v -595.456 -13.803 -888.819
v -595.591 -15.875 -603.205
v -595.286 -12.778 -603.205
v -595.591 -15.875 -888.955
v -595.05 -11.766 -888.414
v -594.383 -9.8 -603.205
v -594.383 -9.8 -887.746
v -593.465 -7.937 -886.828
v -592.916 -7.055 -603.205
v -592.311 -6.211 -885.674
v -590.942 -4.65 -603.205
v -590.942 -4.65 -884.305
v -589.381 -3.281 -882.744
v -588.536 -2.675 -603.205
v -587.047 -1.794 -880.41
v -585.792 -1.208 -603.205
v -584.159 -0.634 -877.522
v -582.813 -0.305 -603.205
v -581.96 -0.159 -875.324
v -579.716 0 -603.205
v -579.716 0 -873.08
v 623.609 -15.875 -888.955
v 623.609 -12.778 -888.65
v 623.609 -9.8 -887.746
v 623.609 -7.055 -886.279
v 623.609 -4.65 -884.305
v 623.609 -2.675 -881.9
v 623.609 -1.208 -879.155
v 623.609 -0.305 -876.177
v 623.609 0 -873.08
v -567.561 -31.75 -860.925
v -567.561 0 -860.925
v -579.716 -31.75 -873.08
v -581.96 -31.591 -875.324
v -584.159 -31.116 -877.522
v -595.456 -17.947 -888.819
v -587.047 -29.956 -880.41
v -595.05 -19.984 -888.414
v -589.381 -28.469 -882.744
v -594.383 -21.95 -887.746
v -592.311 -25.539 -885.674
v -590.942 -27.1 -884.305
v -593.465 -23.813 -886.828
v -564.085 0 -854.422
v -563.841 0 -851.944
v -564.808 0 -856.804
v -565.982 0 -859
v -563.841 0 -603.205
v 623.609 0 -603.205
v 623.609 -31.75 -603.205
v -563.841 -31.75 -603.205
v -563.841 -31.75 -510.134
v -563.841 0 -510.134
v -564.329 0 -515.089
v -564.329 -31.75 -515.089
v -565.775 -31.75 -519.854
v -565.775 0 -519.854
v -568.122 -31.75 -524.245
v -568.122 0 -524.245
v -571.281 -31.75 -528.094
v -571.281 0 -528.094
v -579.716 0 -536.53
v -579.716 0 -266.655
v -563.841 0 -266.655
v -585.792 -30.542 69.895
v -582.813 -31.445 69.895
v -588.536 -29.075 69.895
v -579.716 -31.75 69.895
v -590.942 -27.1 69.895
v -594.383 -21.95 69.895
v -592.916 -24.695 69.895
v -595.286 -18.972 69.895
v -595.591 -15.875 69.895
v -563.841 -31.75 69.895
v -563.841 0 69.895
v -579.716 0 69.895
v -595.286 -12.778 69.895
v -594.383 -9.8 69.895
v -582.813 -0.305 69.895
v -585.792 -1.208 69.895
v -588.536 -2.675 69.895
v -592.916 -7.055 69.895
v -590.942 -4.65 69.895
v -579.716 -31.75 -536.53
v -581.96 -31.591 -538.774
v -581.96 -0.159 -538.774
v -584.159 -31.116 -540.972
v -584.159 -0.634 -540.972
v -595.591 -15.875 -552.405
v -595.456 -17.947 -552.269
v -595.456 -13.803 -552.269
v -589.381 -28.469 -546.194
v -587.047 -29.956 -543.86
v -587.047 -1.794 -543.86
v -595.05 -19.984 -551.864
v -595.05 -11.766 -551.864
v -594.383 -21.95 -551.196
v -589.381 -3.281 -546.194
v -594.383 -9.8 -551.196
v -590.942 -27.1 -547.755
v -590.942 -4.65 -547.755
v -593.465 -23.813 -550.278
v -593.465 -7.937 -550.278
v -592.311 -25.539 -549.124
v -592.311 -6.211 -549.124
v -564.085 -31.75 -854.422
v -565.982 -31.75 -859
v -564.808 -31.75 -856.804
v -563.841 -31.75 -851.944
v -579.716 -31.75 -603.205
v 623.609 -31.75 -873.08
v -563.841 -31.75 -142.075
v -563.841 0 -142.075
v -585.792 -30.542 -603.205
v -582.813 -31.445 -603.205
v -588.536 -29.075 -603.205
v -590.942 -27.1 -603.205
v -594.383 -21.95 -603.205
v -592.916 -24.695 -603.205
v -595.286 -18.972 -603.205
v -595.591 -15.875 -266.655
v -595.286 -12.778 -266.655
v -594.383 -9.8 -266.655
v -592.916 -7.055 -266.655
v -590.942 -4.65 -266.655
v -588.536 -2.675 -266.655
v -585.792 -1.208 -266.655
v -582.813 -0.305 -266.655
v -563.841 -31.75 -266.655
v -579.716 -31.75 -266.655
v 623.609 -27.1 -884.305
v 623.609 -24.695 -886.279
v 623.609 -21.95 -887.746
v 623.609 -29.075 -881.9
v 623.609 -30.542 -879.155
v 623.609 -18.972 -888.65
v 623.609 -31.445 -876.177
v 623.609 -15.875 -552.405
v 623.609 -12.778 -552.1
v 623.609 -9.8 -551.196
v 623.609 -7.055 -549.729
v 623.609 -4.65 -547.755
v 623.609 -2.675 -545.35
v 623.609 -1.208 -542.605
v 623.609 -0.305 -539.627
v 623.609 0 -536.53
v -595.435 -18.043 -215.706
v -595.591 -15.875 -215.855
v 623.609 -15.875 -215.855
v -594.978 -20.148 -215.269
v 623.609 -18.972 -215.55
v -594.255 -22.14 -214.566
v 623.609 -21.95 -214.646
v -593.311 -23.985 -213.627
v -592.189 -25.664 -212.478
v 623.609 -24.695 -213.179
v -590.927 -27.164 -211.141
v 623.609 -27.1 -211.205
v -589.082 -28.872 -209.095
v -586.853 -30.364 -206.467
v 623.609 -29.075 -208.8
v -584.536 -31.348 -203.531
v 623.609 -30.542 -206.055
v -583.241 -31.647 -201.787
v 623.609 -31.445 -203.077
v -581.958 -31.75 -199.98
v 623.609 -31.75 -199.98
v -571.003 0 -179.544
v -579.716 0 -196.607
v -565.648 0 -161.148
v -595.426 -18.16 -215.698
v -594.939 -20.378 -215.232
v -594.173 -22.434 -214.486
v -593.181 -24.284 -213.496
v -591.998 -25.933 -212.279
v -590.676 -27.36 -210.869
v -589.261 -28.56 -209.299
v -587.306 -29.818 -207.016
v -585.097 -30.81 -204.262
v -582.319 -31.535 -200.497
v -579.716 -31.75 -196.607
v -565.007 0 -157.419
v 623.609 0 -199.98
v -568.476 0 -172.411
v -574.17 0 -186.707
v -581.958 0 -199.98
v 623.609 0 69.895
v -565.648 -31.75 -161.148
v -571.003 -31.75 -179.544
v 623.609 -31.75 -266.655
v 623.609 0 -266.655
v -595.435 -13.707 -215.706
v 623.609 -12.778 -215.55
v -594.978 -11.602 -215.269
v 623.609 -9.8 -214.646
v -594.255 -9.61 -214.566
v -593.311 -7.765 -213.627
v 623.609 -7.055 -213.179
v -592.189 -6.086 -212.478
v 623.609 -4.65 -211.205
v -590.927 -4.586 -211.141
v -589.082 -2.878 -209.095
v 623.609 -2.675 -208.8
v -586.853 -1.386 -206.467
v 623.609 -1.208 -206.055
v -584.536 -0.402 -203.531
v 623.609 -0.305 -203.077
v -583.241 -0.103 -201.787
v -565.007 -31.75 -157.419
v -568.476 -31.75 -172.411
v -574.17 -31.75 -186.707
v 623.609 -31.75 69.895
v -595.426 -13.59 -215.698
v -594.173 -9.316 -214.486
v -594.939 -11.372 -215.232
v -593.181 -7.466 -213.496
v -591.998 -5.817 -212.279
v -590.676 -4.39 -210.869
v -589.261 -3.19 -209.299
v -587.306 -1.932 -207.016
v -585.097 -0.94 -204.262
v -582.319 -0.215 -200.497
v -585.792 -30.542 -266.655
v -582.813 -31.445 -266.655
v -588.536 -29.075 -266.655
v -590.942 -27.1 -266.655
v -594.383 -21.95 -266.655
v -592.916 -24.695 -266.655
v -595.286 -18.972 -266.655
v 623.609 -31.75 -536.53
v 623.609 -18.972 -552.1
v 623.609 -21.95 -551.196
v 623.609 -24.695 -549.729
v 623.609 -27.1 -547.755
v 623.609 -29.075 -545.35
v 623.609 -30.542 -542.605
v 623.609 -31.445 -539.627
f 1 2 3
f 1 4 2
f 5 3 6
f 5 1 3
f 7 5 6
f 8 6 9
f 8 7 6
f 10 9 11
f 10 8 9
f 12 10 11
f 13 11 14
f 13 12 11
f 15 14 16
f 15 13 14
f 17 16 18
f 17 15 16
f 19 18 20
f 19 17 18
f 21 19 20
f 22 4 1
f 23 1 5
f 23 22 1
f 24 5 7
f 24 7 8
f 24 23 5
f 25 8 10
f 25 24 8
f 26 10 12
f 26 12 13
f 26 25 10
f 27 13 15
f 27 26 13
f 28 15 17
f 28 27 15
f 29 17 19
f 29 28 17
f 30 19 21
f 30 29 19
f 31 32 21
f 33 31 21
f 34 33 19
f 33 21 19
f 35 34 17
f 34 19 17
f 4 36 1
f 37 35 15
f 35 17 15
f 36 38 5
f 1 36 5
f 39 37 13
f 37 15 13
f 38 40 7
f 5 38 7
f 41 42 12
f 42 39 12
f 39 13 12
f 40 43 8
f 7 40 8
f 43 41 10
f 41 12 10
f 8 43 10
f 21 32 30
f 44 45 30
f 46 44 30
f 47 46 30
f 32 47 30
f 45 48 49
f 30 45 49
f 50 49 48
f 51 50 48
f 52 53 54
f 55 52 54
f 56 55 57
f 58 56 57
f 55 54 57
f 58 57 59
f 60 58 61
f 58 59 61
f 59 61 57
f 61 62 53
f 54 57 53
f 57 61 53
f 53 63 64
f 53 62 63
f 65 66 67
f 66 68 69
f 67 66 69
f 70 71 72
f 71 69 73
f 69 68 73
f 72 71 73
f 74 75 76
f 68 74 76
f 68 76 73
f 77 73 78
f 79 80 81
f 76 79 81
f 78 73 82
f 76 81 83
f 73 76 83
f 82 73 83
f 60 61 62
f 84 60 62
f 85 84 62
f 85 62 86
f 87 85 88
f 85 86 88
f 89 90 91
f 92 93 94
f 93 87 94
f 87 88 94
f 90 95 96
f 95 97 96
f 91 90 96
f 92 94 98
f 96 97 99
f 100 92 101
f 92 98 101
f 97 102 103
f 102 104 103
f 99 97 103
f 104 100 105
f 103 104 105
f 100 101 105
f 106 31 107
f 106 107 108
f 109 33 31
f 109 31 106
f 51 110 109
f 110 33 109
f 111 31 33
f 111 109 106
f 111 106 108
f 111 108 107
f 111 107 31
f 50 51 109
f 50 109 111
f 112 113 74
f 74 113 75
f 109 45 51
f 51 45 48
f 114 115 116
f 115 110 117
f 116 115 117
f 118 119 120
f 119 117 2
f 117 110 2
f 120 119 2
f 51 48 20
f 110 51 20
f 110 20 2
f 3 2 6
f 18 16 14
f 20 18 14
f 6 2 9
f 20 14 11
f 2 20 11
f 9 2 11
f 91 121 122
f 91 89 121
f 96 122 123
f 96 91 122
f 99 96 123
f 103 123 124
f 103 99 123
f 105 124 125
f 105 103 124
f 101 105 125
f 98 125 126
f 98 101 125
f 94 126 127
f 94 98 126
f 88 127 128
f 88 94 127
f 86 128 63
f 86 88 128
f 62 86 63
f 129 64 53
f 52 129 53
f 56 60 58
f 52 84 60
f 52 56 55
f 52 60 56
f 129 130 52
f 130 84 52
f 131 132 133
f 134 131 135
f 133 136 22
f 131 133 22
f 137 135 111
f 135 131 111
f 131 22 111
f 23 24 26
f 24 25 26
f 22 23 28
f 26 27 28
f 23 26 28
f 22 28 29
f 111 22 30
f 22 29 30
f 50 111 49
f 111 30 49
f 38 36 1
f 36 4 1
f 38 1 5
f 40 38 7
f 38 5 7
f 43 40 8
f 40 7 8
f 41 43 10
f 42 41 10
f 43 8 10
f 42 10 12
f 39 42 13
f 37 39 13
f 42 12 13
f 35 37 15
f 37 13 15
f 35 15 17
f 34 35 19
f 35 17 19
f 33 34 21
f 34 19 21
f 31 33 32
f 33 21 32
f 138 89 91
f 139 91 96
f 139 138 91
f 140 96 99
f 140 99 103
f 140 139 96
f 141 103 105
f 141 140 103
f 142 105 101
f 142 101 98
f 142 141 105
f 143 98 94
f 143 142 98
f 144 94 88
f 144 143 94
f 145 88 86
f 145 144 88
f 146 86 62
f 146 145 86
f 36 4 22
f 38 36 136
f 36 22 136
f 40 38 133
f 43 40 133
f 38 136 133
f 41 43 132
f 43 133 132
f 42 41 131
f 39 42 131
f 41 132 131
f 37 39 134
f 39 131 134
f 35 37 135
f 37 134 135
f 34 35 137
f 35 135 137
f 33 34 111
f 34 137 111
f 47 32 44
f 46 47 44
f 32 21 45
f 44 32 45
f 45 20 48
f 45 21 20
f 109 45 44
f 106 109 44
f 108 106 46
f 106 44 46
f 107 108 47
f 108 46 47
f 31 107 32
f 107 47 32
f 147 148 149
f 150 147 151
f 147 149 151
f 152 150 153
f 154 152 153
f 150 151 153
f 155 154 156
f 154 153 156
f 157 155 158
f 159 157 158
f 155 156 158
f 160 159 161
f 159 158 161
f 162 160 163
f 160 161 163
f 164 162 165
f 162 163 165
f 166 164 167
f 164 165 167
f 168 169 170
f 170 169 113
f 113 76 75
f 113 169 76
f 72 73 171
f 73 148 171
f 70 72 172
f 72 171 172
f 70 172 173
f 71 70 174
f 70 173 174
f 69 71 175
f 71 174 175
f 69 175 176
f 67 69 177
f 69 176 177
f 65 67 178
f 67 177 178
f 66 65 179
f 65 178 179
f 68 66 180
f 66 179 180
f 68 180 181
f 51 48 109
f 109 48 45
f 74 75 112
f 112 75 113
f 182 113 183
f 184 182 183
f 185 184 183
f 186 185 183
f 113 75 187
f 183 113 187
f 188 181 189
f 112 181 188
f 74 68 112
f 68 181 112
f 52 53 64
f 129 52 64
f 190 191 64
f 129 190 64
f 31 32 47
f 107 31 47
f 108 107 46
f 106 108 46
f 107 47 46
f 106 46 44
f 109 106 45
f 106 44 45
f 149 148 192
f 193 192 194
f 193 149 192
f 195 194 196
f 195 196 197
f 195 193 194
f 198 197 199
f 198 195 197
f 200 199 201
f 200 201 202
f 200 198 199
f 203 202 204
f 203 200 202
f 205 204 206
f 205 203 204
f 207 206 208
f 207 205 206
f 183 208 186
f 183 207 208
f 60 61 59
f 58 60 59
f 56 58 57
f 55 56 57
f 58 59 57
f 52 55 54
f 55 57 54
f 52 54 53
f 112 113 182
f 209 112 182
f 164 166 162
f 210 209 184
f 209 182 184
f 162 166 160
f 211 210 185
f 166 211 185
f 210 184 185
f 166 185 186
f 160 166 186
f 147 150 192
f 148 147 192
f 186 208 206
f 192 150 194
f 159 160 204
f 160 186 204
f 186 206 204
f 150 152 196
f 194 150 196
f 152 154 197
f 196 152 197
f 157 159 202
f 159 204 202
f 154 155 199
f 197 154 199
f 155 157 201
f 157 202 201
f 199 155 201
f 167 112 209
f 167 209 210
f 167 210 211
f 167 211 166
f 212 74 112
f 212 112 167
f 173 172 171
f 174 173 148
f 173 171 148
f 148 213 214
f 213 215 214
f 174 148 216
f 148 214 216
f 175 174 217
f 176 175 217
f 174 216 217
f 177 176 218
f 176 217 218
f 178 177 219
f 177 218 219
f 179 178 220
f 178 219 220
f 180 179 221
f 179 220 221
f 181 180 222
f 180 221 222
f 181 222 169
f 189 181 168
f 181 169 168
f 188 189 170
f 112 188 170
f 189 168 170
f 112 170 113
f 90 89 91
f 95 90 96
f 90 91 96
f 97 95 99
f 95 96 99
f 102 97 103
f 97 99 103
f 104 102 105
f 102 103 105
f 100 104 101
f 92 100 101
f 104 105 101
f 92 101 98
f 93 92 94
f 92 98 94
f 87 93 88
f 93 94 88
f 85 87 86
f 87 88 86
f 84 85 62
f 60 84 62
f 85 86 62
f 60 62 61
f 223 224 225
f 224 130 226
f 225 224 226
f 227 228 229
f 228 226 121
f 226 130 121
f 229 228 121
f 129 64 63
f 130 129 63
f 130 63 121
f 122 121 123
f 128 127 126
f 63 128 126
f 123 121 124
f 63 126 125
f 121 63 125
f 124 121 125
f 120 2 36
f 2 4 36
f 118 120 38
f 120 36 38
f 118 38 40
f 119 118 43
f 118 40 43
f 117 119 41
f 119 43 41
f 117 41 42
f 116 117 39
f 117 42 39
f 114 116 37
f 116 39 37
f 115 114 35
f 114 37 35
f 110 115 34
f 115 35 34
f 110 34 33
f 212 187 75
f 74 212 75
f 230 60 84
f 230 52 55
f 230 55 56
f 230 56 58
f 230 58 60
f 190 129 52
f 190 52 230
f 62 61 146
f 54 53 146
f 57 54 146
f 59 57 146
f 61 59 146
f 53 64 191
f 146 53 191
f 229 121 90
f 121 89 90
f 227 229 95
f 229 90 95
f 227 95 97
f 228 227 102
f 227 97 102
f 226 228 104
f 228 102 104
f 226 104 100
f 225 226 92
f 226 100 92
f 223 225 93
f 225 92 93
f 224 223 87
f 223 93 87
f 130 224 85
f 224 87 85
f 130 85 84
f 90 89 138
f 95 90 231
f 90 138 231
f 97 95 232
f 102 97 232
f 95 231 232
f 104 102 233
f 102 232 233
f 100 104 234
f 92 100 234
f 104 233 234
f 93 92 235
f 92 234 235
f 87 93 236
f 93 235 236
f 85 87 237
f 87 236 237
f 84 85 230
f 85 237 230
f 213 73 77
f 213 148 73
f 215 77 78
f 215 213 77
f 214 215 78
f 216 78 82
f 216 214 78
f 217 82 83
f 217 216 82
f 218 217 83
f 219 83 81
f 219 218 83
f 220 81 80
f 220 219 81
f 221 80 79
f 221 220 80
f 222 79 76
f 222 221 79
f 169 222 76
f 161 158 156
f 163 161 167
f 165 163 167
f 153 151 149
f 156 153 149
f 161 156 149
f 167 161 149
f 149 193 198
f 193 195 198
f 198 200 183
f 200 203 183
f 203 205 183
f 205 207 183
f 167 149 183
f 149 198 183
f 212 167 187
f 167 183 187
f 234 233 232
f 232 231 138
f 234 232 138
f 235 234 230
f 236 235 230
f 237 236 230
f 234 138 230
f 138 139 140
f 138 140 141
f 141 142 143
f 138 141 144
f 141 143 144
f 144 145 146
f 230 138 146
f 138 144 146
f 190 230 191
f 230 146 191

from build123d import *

# Parameters (mm, degrees)
F1_DEPTH = 31.75
F2_DEPTH = 31.75
F3_R     = 15.87499
F3_2_R   = 15.87499
F3_3_R   = 15.87499
F3_4_R   = 15.87499
F3_5_R   = 15.87499
F3_6_R   = 15.87499


# Not quite as in the source:
# - a fillet or chamfer is up to 0.001 mm smaller than in the source, because OpenCascade refuses the exact size


with BuildPart() as f1:
    # F0 (on Front) → F1 (new body)
    with BuildSketch(Plane.XZ):
        with BuildLine():
            Line((623.6085797757, 69.8951120117), (-563.8414202243, 69.8951120117))
            Line((-563.8414202243, 69.8951120117), (-563.8414202243, -142.074555243))
            ThreePointArc((-563.8414202243, -142.074555243), (-572.1158610243, -182.2354815272), (-595.5914202243, -215.8548879883))
            Line((-595.5914202243, -215.8548879883), (623.6085797757, -215.8548879883))
            Line((623.6085797757, -215.8548879883), (623.6085797757, 69.8951120117))
        make_face()
    extrude(amount=F1_DEPTH)

    # F3#6 (radius 15.875 in the source; OpenCascade refuses exactly that, so slightly less here)
    f3_6_edges = [f1.edges().sort_by_distance(p)[0] for p in [
        (14.00858, -31.75, -215.854888),
        (14.00858, 0, -215.854888),
    ]]
    fillet(f3_6_edges, radius=F3_6_R)


with BuildPart() as f1b:
    # F0 (on Front) → F1, piece 2 (new body)
    with BuildSketch(Plane.XZ):
        with BuildLine():
            Line((623.6085797757, -266.6548879883), (-563.8414202243, -266.6548879883))
            Line((-563.8414202243, -266.6548879883), (-563.8414202243, -510.133863504))
            ThreePointArc((-563.8414202243, -510.133863504), (-565.7748800985, -519.8540226861), (-571.2809079822, -528.0943757462))
            Line((-571.2809079822, -528.0943757462), (-595.5914202243, -552.4048879883))
            Line((-595.5914202243, -552.4048879883), (623.6085797757, -552.4048879883))
            Line((623.6085797757, -552.4048879883), (623.6085797757, -266.6548879883))
        make_face()
    extrude(amount=F1_DEPTH)

    # F3#3 (radius 15.875 in the source; OpenCascade refuses exactly that, so slightly less here)
    f3_3_edges = [f1b.edges().sort_by_distance(p)[0] for p in [
        (14.00858, -31.75, -552.404888),
        (14.00858, 0, -552.404888),
    ]]
    fillet(f3_3_edges, radius=F3_3_R)


with BuildPart() as f1c:
    # F0 (on Front) → F1, piece 3 (new body)
    with BuildSketch(Plane.XZ):
        with BuildLine():
            Line((623.6085797757, -603.2048879883), (-563.8414202243, -603.2048879883))
            Line((-563.8414202243, -603.2048879883), (-563.8414202243, -851.9443757462))
            ThreePointArc((-563.8414202243, -851.9443757462), (-564.8081501614, -856.8044553372), (-567.5611641032, -860.9246318672))
            Line((-567.5611641032, -860.9246318672), (-595.5914202243, -888.9548879883))
            Line((-595.5914202243, -888.9548879883), (623.6085797757, -888.9548879883))
            Line((623.6085797757, -888.9548879883), (623.6085797757, -603.2048879883))
        make_face()
    extrude(amount=F1_DEPTH)

    # F3 (radius 15.875 in the source; OpenCascade refuses exactly that, so slightly less here)
    f3_edges = [f1c.edges().sort_by_distance(p)[0] for p in [
        (14.00858, -31.75, -888.954888),
        (14.00858, 0, -888.954888),
    ]]
    fillet(f3_edges, radius=F3_R)


with BuildPart() as f2:
    # F0 (on Front) → F2 (new body)
    with BuildSketch(Plane.XZ):
        with BuildLine():
            Line((-563.8414202243, 69.8951120117), (-595.5914202243, 69.8951120117))
            Line((-595.5914202243, 69.8951120117), (-595.5914202243, -215.8548879883))
            ThreePointArc((-595.5914202243, -215.8548879883), (-572.1158610243, -182.2354815272), (-563.8414202243, -142.074555243))
            Line((-563.8414202243, -142.074555243), (-563.8414202243, 69.8951120117))
        make_face()
    extrude(amount=F2_DEPTH)

    # F3#5 (radius 15.875 in the source; OpenCascade refuses exactly that, so slightly less here)
    f3_5_edges = [f2.edges().sort_by_distance(p)[0] for p in [
        (-595.59142, -31.75, -72.979888),
        (-595.59142, 0, -72.979888),
    ]]
    fillet(f3_5_edges, radius=F3_5_R)


with BuildPart() as f2b:
    # F0 (on Front) → F2, piece 2 (new body)
    with BuildSketch(Plane.XZ):
        with BuildLine():
            Line((-563.8414202243, -266.6548879883), (-595.5914202243, -266.6548879883))
            Line((-595.5914202243, -266.6548879883), (-595.5914202243, -552.4048879883))
            Line((-595.5914202243, -552.4048879883), (-571.2809079822, -528.0943757462))
            ThreePointArc((-571.2809079822, -528.0943757462), (-565.7748800985, -519.8540226861), (-563.8414202243, -510.133863504))
            Line((-563.8414202243, -510.133863504), (-563.8414202243, -266.6548879883))
        make_face()
    extrude(amount=F2_DEPTH)

    # F3#4 (radius 15.875 in the source; OpenCascade refuses exactly that, so slightly less here)
    f3_4_edges = [f2b.edges().sort_by_distance(p)[0] for p in [
        (-595.59142, -31.75, -409.529888),
        (-595.59142, 0, -409.529888),
    ]]
    fillet(f3_4_edges, radius=F3_4_R)


with BuildPart() as f2c:
    # F0 (on Front) → F2, piece 3 (new body)
    with BuildSketch(Plane.XZ):
        with BuildLine():
            Line((-563.8414202243, -603.2048879883), (-595.5914202243, -603.2048879883))
            Line((-595.5914202243, -603.2048879883), (-595.5914202243, -888.9548879883))
            Line((-595.5914202243, -888.9548879883), (-567.5611641032, -860.9246318672))
            ThreePointArc((-567.5611641032, -860.9246318672), (-564.8081501614, -856.8044553372), (-563.8414202243, -851.9443757462))
            Line((-563.8414202243, -851.9443757462), (-563.8414202243, -603.2048879883))
        make_face()
    extrude(amount=F2_DEPTH)

    # F3#2 (radius 15.875 in the source; OpenCascade refuses exactly that, so slightly less here)
    f3_2_edges = [f2c.edges().sort_by_distance(p)[0] for p in [
        (-595.59142, -31.75, -746.079888),
        (-595.59142, 0, -746.079888),
    ]]
    fillet(f3_2_edges, radius=F3_2_R)


solid = Compound([f1.part, f1b.part, f1c.part, f2.part, f2b.part, f2c.part])
